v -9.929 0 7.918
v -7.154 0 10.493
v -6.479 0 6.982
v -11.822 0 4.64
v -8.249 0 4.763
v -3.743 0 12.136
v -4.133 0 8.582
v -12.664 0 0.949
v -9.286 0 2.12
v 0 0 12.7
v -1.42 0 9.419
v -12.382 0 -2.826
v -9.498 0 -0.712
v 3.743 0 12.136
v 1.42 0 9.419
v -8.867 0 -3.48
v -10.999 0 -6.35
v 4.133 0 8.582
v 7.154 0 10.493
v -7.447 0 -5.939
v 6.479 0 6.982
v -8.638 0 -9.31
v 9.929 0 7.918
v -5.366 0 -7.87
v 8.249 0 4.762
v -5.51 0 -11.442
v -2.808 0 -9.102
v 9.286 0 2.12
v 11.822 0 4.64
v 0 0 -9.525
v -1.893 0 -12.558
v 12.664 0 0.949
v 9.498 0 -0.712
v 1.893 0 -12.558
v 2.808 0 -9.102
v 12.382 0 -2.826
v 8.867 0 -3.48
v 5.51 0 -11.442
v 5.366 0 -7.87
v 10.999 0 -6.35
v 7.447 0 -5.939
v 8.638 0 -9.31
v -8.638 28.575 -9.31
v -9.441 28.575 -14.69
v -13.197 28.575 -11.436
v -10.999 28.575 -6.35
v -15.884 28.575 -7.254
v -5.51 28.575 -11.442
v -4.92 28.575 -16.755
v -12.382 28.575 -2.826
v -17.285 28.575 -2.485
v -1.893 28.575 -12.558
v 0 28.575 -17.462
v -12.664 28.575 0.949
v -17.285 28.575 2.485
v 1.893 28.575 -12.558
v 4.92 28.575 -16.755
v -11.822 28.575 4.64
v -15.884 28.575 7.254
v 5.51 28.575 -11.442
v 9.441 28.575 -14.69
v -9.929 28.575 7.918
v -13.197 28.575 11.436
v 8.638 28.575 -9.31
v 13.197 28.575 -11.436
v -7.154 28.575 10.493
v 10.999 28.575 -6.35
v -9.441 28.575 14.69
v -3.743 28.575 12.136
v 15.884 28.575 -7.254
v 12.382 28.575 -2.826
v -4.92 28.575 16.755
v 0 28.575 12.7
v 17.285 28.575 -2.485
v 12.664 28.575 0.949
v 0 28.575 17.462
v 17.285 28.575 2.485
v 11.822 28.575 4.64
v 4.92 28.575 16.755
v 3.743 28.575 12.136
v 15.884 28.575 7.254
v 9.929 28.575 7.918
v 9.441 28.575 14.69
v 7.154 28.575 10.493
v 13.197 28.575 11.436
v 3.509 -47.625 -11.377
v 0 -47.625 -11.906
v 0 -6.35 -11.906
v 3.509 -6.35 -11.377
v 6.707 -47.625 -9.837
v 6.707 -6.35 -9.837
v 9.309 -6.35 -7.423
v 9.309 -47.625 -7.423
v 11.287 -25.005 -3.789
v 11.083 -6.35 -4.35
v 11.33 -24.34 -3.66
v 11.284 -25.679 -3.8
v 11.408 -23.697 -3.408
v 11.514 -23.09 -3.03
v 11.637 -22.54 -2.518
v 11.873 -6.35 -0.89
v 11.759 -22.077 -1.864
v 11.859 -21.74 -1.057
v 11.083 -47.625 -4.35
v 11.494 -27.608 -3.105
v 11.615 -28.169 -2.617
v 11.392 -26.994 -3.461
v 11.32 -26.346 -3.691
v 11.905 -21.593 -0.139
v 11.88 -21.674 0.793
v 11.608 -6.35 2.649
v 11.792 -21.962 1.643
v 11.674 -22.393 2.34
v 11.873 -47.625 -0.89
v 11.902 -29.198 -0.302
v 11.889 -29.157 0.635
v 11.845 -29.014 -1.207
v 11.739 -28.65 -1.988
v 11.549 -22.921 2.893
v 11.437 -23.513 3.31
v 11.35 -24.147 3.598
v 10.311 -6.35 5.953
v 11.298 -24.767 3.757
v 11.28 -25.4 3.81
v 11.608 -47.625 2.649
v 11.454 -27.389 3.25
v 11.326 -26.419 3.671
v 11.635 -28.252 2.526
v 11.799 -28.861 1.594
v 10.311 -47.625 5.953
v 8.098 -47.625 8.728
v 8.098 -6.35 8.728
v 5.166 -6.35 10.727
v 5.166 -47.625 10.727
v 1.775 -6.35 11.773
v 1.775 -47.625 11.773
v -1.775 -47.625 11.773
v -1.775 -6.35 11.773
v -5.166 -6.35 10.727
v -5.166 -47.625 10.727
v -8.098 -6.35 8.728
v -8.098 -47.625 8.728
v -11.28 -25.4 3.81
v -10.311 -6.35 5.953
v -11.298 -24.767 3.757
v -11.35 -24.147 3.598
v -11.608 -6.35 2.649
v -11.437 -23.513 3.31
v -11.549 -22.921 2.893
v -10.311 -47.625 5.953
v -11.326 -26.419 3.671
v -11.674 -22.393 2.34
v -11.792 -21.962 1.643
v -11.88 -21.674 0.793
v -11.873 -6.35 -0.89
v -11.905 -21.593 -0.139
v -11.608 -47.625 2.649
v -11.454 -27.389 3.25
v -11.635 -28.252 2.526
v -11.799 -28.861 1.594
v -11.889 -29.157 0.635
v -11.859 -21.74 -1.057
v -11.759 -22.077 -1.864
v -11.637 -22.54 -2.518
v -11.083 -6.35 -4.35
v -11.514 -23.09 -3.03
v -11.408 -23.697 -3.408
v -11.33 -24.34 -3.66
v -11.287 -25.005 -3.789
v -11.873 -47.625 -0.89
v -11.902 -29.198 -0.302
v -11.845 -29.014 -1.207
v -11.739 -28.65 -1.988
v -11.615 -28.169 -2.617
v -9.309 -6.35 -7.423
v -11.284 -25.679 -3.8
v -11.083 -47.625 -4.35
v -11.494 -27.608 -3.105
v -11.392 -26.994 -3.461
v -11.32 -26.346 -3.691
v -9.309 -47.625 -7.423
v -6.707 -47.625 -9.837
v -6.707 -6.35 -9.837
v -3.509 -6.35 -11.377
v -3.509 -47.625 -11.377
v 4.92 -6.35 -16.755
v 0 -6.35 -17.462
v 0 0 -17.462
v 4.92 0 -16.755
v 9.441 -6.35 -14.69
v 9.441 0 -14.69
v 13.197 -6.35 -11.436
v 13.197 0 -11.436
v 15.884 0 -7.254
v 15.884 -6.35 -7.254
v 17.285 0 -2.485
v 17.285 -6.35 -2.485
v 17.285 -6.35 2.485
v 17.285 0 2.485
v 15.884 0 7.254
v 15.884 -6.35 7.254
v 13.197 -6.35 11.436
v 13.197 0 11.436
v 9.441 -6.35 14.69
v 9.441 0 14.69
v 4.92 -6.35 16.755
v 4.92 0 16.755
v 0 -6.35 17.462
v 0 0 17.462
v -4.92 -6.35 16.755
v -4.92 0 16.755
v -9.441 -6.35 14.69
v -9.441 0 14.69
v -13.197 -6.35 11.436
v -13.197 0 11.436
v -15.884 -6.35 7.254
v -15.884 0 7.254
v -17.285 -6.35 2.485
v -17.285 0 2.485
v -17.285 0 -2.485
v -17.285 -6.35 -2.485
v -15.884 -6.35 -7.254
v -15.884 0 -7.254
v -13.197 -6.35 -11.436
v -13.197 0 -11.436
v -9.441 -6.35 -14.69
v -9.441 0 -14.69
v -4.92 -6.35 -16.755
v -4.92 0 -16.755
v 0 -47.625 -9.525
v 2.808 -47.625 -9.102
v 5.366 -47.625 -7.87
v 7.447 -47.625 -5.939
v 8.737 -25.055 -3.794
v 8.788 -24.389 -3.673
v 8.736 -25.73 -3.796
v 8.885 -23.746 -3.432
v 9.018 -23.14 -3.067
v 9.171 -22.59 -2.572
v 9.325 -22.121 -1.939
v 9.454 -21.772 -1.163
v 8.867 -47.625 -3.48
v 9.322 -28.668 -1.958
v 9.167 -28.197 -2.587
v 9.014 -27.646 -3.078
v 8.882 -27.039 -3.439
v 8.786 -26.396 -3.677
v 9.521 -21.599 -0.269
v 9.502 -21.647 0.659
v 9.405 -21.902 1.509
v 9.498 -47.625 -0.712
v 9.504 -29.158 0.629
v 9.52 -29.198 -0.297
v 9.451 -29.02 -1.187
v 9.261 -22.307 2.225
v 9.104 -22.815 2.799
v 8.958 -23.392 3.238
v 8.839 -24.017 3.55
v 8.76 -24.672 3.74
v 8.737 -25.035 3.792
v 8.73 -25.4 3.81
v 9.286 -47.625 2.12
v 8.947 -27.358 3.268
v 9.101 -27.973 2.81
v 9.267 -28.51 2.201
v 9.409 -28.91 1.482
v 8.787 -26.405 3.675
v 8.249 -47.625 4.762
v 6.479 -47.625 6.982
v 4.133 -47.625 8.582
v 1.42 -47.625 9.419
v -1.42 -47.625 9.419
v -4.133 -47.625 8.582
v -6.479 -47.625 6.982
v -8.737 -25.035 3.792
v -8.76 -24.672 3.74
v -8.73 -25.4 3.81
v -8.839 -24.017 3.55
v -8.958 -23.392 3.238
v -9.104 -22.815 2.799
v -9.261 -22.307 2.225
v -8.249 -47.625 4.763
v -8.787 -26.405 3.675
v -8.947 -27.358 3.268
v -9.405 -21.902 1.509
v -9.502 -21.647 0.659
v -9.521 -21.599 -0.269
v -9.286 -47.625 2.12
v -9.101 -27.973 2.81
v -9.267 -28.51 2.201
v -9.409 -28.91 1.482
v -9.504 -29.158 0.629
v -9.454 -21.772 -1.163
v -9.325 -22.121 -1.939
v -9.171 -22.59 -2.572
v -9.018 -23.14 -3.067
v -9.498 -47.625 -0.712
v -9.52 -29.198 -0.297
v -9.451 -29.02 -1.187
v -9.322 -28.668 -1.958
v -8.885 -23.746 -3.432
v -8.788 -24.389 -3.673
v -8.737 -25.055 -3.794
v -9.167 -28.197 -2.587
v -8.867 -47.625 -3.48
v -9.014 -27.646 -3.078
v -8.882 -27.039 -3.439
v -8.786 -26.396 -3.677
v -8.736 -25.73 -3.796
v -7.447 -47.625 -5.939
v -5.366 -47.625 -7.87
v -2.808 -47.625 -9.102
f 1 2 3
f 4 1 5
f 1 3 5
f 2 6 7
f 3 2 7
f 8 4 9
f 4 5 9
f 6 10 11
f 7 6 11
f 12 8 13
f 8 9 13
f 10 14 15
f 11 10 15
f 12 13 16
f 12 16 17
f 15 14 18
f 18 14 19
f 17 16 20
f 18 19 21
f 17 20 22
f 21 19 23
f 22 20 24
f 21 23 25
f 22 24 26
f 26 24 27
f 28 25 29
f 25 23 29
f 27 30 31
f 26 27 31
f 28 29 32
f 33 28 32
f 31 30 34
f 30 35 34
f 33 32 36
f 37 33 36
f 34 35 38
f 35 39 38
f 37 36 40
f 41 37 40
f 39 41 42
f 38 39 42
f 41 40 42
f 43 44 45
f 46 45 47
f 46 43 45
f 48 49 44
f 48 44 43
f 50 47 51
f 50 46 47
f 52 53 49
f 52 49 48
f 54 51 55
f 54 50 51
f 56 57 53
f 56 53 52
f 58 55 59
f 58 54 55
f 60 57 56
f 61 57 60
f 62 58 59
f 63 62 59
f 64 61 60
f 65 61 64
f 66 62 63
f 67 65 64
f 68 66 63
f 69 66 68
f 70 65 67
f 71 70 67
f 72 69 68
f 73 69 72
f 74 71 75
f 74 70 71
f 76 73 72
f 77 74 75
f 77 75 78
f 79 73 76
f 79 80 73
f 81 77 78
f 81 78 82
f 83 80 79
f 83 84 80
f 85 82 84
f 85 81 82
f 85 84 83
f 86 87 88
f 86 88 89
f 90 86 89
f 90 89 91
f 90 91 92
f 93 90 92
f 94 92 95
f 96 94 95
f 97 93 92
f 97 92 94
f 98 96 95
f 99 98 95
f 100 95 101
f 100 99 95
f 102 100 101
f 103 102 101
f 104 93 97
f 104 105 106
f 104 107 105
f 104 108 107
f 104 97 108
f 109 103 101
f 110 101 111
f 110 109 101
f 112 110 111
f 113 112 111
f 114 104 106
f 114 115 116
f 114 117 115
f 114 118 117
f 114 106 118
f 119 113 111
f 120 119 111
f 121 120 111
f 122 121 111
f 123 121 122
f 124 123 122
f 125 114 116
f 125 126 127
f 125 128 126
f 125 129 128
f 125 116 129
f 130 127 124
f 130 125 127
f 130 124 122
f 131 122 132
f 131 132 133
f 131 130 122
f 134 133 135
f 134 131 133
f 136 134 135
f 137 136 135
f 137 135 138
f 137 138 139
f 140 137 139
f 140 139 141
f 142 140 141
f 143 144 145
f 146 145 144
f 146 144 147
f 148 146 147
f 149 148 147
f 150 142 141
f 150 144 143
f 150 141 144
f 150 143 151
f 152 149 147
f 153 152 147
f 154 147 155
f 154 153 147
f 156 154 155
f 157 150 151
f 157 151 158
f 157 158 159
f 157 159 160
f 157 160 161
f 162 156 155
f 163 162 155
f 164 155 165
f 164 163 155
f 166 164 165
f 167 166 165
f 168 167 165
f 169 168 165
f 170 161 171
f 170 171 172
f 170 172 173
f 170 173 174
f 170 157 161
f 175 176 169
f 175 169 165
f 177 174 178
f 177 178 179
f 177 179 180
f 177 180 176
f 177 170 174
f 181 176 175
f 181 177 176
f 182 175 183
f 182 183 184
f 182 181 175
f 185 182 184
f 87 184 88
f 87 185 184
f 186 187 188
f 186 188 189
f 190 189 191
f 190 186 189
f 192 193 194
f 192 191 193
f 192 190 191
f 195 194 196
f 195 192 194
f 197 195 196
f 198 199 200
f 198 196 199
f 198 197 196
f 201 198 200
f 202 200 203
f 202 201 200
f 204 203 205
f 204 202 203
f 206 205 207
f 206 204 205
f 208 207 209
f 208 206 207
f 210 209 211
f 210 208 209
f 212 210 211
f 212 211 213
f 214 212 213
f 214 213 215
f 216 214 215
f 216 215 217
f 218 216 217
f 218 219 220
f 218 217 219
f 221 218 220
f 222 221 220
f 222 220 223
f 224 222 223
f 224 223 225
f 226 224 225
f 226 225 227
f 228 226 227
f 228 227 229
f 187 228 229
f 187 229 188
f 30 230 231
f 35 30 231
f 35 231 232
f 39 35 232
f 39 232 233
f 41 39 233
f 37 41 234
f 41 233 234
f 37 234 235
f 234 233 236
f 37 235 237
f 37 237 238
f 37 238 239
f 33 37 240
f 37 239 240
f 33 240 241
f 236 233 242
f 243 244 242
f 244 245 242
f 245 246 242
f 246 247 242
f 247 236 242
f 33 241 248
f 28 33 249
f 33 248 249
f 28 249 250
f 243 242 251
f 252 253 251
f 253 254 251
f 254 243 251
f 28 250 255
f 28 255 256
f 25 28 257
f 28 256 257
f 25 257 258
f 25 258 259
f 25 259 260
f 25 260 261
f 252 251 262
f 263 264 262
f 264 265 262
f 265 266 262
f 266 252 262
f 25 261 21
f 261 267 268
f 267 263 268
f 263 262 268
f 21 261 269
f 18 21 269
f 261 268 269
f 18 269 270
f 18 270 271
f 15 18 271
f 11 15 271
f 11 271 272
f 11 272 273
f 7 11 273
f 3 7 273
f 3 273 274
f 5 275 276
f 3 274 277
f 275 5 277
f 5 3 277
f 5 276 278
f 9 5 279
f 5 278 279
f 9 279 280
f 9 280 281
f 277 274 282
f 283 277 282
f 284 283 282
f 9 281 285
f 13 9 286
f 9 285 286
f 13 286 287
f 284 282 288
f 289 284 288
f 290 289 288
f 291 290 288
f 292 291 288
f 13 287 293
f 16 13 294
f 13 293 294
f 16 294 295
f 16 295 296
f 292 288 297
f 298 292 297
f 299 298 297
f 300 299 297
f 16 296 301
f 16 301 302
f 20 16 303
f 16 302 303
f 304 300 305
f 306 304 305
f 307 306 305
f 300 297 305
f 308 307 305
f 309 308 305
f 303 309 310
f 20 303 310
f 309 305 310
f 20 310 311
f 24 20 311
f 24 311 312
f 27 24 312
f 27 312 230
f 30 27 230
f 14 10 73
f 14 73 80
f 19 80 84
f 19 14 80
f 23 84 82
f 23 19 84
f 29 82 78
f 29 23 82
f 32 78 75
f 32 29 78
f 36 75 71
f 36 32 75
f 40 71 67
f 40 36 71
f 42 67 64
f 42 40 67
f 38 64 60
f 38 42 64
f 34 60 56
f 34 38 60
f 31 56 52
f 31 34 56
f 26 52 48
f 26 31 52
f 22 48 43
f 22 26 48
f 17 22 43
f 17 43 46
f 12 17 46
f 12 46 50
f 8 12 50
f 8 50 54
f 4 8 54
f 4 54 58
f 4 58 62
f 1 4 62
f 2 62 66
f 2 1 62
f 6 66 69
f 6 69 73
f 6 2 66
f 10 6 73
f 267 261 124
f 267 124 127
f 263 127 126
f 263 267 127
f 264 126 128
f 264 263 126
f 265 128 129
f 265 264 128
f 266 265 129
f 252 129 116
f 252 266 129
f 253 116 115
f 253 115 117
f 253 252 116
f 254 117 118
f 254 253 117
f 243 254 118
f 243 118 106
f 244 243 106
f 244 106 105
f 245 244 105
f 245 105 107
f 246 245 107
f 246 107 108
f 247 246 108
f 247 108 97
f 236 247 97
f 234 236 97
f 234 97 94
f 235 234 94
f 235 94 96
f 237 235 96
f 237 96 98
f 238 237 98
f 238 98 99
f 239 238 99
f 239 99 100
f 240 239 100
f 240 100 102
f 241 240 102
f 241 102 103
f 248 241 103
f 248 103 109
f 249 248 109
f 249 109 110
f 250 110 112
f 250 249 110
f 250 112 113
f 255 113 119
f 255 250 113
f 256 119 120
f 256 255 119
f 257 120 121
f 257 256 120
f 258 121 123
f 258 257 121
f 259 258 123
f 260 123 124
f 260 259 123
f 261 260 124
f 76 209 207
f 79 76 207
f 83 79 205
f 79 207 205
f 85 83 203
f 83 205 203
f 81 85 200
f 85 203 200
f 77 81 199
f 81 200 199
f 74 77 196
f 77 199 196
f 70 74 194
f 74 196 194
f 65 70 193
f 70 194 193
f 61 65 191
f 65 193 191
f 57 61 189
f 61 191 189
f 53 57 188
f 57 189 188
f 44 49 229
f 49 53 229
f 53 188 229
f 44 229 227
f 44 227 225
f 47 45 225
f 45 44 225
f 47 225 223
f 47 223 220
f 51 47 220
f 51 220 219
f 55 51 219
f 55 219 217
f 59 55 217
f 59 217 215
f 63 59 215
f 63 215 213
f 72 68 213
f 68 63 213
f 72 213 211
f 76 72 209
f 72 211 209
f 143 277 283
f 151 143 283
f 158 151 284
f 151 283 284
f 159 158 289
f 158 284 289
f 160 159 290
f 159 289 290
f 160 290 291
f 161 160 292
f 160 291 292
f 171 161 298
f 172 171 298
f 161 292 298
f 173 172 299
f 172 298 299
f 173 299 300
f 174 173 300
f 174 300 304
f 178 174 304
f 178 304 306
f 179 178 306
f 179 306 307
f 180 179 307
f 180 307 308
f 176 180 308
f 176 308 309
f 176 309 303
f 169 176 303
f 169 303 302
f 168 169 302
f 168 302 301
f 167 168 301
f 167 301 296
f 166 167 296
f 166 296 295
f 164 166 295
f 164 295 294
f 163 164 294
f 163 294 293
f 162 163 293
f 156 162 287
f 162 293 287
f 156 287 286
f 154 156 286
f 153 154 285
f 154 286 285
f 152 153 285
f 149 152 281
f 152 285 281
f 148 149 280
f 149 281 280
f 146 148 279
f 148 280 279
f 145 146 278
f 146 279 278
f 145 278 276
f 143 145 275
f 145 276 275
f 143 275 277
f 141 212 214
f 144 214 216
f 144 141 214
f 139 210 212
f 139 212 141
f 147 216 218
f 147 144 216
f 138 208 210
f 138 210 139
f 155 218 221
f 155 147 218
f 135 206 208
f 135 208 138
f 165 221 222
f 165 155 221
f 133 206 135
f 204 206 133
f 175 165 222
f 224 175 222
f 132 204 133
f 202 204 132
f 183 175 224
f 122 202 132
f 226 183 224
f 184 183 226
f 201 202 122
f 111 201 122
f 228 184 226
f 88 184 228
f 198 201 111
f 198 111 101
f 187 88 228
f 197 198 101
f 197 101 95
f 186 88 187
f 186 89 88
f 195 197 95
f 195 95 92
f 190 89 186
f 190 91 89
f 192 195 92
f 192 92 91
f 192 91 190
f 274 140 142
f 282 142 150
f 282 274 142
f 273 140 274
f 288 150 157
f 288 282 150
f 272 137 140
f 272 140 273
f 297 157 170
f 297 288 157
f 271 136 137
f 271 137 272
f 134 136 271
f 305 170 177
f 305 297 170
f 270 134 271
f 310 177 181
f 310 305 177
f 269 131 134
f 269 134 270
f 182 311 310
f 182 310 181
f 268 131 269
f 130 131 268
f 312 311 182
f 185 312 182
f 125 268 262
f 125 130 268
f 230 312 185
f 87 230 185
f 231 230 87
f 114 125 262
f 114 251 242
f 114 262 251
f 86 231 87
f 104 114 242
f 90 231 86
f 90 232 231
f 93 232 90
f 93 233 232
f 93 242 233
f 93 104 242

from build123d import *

# Parameters (mm, degrees)
SKETCH1_R            = 17.4625
SKETCH1_R_2          = 12.7
SPRING_CHAMBER_DEPTH = 28.575
BALL_CHAMBER_START   = 47.625
SKETCH2_R            = 17.4625
SKETCH2_R_2          = 9.525
BALL_CHAMBER_DEPTH   = 47.625
SKETCH5_R            = 3.81
BALL_HOLE_DEPTH      = 54.647166165
SKETCH8_R            = 17.4625
SKETCH8_R_2          = 11.90625
CUT_EXTRUDE2_DEPTH   = 41.275
SKETCH6_R            = 17.4625
SKETCH6_R_2          = 1.651
BOSS_EXTRUDE4_DEPTH  = 6.35


with BuildPart() as part:
    # Sketch1 → spring_chamber (new body)
    with BuildSketch(Plane(origin=(0, 0, 0), x_dir=(1, 0, 0), z_dir=(0, 1, 0))):
        with Locations(Location((0, 0, 0), (0, 0, 270))):
            Circle(SKETCH1_R)
        with Locations(Location((0, 0, 0), (0, 0, 270))):
            Circle(SKETCH1_R_2, mode=Mode.SUBTRACT)
    extrude(amount=SPRING_CHAMBER_DEPTH)

    # Sketch2 → ball_chamber (add)
    with BuildSketch(Plane.XZ.offset(BALL_CHAMBER_START)):
        with Locations(Location((0, 0, 0), (0, 0, 270))):
            Circle(SKETCH2_R)
        with Locations(Location((0, 0, 0), (0, 0, 270))):
            Circle(SKETCH2_R_2, mode=Mode.SUBTRACT)
    extrude(amount=-BALL_CHAMBER_DEPTH)

    # Sketch5 → ball_hole (cut, through all)
    with BuildSketch(Plane(origin=(0, 0, 0), x_dir=(0, 0, -1), z_dir=(1, 0, 0))):
        with Locations(Location((0, -25.4, 0), (0, 0, 180))):
            Circle(SKETCH5_R)
    ball_hole = extrude(amount=BALL_HOLE_DEPTH, mode=Mode.SUBTRACT)

    # Sketch8 → Cut-Extrude2 (cut)
    with BuildSketch(Plane.XZ.offset(47.625)):
        with Locations(Location((0, 0, 0), (0, 0, 270))):
            Circle(SKETCH8_R)
        with Locations(Location((0, 0, 0), (0, 0, 270))):
            Circle(SKETCH8_R_2, mode=Mode.SUBTRACT)
    extrude(amount=-CUT_EXTRUDE2_DEPTH, mode=Mode.SUBTRACT)

    # Mirror1: ball_hole across plane
    add(ball_hole.mirror(Plane(origin=(0, 0, 0), x_dir=(0, 0, 1), z_dir=(1, 0, 0))), mode=Mode.SUBTRACT)

    # Sketch6 → Boss-Extrude4 (add)
    with BuildSketch(Plane(origin=(0, 28.575, 0), x_dir=(1, 0, 0), z_dir=(0, 1, 0))):
        with BuildLine():
            ThreePointArc((-28.810185185, 6.345643224), (-34.925, 0), (-28.810185185, -6.345643224))
            ThreePointArc((-28.810185185, -6.345643224), (-23.017865483, -7.988458599), (-18.633080808, -12.114409792))
            ThreePointArc((-18.633080808, -12.114409792), (0, -22.225), (18.633080808, -12.114409792))
            ThreePointArc((18.633080808, -12.114409792), (23.017865483, -7.988458599), (28.810185185, -6.345643224))
            ThreePointArc((28.810185185, -6.345643224), (34.925, 0), (28.810185185, 6.345643224))
            ThreePointArc((28.810185185, 6.345643224), (23.017865483, 7.988458599), (18.633080808, 12.114409792))
            ThreePointArc((18.633080808, 12.114409792), (0, 22.225), (-18.633080808, 12.114409792))
            ThreePointArc((-18.633080808, 12.114409792), (-23.017865483, 7.988458599), (-28.810185185, 6.345643224))
        make_face()
        with Locations(Location((0, 0, 0), (0, 0, 90))):
            Circle(SKETCH6_R, mode=Mode.SUBTRACT)
        with Locations((-28.575, 0)):
            Circle(SKETCH6_R_2, mode=Mode.SUBTRACT)
        with Locations((28.575, 0)):
            Circle(SKETCH6_R_2, mode=Mode.SUBTRACT)
    extrude(amount=BOSS_EXTRUDE4_DEPTH)


with BuildPart() as boss_extrude4_kept_piece:
    # of the separate pieces the step leaves, the one the design keeps (boss_extrude4_pieces_kept)
    add(part.part.solids().sort_by_distance((0, 0, 17.4625))[0])


solid = boss_extrude4_kept_piece.part
